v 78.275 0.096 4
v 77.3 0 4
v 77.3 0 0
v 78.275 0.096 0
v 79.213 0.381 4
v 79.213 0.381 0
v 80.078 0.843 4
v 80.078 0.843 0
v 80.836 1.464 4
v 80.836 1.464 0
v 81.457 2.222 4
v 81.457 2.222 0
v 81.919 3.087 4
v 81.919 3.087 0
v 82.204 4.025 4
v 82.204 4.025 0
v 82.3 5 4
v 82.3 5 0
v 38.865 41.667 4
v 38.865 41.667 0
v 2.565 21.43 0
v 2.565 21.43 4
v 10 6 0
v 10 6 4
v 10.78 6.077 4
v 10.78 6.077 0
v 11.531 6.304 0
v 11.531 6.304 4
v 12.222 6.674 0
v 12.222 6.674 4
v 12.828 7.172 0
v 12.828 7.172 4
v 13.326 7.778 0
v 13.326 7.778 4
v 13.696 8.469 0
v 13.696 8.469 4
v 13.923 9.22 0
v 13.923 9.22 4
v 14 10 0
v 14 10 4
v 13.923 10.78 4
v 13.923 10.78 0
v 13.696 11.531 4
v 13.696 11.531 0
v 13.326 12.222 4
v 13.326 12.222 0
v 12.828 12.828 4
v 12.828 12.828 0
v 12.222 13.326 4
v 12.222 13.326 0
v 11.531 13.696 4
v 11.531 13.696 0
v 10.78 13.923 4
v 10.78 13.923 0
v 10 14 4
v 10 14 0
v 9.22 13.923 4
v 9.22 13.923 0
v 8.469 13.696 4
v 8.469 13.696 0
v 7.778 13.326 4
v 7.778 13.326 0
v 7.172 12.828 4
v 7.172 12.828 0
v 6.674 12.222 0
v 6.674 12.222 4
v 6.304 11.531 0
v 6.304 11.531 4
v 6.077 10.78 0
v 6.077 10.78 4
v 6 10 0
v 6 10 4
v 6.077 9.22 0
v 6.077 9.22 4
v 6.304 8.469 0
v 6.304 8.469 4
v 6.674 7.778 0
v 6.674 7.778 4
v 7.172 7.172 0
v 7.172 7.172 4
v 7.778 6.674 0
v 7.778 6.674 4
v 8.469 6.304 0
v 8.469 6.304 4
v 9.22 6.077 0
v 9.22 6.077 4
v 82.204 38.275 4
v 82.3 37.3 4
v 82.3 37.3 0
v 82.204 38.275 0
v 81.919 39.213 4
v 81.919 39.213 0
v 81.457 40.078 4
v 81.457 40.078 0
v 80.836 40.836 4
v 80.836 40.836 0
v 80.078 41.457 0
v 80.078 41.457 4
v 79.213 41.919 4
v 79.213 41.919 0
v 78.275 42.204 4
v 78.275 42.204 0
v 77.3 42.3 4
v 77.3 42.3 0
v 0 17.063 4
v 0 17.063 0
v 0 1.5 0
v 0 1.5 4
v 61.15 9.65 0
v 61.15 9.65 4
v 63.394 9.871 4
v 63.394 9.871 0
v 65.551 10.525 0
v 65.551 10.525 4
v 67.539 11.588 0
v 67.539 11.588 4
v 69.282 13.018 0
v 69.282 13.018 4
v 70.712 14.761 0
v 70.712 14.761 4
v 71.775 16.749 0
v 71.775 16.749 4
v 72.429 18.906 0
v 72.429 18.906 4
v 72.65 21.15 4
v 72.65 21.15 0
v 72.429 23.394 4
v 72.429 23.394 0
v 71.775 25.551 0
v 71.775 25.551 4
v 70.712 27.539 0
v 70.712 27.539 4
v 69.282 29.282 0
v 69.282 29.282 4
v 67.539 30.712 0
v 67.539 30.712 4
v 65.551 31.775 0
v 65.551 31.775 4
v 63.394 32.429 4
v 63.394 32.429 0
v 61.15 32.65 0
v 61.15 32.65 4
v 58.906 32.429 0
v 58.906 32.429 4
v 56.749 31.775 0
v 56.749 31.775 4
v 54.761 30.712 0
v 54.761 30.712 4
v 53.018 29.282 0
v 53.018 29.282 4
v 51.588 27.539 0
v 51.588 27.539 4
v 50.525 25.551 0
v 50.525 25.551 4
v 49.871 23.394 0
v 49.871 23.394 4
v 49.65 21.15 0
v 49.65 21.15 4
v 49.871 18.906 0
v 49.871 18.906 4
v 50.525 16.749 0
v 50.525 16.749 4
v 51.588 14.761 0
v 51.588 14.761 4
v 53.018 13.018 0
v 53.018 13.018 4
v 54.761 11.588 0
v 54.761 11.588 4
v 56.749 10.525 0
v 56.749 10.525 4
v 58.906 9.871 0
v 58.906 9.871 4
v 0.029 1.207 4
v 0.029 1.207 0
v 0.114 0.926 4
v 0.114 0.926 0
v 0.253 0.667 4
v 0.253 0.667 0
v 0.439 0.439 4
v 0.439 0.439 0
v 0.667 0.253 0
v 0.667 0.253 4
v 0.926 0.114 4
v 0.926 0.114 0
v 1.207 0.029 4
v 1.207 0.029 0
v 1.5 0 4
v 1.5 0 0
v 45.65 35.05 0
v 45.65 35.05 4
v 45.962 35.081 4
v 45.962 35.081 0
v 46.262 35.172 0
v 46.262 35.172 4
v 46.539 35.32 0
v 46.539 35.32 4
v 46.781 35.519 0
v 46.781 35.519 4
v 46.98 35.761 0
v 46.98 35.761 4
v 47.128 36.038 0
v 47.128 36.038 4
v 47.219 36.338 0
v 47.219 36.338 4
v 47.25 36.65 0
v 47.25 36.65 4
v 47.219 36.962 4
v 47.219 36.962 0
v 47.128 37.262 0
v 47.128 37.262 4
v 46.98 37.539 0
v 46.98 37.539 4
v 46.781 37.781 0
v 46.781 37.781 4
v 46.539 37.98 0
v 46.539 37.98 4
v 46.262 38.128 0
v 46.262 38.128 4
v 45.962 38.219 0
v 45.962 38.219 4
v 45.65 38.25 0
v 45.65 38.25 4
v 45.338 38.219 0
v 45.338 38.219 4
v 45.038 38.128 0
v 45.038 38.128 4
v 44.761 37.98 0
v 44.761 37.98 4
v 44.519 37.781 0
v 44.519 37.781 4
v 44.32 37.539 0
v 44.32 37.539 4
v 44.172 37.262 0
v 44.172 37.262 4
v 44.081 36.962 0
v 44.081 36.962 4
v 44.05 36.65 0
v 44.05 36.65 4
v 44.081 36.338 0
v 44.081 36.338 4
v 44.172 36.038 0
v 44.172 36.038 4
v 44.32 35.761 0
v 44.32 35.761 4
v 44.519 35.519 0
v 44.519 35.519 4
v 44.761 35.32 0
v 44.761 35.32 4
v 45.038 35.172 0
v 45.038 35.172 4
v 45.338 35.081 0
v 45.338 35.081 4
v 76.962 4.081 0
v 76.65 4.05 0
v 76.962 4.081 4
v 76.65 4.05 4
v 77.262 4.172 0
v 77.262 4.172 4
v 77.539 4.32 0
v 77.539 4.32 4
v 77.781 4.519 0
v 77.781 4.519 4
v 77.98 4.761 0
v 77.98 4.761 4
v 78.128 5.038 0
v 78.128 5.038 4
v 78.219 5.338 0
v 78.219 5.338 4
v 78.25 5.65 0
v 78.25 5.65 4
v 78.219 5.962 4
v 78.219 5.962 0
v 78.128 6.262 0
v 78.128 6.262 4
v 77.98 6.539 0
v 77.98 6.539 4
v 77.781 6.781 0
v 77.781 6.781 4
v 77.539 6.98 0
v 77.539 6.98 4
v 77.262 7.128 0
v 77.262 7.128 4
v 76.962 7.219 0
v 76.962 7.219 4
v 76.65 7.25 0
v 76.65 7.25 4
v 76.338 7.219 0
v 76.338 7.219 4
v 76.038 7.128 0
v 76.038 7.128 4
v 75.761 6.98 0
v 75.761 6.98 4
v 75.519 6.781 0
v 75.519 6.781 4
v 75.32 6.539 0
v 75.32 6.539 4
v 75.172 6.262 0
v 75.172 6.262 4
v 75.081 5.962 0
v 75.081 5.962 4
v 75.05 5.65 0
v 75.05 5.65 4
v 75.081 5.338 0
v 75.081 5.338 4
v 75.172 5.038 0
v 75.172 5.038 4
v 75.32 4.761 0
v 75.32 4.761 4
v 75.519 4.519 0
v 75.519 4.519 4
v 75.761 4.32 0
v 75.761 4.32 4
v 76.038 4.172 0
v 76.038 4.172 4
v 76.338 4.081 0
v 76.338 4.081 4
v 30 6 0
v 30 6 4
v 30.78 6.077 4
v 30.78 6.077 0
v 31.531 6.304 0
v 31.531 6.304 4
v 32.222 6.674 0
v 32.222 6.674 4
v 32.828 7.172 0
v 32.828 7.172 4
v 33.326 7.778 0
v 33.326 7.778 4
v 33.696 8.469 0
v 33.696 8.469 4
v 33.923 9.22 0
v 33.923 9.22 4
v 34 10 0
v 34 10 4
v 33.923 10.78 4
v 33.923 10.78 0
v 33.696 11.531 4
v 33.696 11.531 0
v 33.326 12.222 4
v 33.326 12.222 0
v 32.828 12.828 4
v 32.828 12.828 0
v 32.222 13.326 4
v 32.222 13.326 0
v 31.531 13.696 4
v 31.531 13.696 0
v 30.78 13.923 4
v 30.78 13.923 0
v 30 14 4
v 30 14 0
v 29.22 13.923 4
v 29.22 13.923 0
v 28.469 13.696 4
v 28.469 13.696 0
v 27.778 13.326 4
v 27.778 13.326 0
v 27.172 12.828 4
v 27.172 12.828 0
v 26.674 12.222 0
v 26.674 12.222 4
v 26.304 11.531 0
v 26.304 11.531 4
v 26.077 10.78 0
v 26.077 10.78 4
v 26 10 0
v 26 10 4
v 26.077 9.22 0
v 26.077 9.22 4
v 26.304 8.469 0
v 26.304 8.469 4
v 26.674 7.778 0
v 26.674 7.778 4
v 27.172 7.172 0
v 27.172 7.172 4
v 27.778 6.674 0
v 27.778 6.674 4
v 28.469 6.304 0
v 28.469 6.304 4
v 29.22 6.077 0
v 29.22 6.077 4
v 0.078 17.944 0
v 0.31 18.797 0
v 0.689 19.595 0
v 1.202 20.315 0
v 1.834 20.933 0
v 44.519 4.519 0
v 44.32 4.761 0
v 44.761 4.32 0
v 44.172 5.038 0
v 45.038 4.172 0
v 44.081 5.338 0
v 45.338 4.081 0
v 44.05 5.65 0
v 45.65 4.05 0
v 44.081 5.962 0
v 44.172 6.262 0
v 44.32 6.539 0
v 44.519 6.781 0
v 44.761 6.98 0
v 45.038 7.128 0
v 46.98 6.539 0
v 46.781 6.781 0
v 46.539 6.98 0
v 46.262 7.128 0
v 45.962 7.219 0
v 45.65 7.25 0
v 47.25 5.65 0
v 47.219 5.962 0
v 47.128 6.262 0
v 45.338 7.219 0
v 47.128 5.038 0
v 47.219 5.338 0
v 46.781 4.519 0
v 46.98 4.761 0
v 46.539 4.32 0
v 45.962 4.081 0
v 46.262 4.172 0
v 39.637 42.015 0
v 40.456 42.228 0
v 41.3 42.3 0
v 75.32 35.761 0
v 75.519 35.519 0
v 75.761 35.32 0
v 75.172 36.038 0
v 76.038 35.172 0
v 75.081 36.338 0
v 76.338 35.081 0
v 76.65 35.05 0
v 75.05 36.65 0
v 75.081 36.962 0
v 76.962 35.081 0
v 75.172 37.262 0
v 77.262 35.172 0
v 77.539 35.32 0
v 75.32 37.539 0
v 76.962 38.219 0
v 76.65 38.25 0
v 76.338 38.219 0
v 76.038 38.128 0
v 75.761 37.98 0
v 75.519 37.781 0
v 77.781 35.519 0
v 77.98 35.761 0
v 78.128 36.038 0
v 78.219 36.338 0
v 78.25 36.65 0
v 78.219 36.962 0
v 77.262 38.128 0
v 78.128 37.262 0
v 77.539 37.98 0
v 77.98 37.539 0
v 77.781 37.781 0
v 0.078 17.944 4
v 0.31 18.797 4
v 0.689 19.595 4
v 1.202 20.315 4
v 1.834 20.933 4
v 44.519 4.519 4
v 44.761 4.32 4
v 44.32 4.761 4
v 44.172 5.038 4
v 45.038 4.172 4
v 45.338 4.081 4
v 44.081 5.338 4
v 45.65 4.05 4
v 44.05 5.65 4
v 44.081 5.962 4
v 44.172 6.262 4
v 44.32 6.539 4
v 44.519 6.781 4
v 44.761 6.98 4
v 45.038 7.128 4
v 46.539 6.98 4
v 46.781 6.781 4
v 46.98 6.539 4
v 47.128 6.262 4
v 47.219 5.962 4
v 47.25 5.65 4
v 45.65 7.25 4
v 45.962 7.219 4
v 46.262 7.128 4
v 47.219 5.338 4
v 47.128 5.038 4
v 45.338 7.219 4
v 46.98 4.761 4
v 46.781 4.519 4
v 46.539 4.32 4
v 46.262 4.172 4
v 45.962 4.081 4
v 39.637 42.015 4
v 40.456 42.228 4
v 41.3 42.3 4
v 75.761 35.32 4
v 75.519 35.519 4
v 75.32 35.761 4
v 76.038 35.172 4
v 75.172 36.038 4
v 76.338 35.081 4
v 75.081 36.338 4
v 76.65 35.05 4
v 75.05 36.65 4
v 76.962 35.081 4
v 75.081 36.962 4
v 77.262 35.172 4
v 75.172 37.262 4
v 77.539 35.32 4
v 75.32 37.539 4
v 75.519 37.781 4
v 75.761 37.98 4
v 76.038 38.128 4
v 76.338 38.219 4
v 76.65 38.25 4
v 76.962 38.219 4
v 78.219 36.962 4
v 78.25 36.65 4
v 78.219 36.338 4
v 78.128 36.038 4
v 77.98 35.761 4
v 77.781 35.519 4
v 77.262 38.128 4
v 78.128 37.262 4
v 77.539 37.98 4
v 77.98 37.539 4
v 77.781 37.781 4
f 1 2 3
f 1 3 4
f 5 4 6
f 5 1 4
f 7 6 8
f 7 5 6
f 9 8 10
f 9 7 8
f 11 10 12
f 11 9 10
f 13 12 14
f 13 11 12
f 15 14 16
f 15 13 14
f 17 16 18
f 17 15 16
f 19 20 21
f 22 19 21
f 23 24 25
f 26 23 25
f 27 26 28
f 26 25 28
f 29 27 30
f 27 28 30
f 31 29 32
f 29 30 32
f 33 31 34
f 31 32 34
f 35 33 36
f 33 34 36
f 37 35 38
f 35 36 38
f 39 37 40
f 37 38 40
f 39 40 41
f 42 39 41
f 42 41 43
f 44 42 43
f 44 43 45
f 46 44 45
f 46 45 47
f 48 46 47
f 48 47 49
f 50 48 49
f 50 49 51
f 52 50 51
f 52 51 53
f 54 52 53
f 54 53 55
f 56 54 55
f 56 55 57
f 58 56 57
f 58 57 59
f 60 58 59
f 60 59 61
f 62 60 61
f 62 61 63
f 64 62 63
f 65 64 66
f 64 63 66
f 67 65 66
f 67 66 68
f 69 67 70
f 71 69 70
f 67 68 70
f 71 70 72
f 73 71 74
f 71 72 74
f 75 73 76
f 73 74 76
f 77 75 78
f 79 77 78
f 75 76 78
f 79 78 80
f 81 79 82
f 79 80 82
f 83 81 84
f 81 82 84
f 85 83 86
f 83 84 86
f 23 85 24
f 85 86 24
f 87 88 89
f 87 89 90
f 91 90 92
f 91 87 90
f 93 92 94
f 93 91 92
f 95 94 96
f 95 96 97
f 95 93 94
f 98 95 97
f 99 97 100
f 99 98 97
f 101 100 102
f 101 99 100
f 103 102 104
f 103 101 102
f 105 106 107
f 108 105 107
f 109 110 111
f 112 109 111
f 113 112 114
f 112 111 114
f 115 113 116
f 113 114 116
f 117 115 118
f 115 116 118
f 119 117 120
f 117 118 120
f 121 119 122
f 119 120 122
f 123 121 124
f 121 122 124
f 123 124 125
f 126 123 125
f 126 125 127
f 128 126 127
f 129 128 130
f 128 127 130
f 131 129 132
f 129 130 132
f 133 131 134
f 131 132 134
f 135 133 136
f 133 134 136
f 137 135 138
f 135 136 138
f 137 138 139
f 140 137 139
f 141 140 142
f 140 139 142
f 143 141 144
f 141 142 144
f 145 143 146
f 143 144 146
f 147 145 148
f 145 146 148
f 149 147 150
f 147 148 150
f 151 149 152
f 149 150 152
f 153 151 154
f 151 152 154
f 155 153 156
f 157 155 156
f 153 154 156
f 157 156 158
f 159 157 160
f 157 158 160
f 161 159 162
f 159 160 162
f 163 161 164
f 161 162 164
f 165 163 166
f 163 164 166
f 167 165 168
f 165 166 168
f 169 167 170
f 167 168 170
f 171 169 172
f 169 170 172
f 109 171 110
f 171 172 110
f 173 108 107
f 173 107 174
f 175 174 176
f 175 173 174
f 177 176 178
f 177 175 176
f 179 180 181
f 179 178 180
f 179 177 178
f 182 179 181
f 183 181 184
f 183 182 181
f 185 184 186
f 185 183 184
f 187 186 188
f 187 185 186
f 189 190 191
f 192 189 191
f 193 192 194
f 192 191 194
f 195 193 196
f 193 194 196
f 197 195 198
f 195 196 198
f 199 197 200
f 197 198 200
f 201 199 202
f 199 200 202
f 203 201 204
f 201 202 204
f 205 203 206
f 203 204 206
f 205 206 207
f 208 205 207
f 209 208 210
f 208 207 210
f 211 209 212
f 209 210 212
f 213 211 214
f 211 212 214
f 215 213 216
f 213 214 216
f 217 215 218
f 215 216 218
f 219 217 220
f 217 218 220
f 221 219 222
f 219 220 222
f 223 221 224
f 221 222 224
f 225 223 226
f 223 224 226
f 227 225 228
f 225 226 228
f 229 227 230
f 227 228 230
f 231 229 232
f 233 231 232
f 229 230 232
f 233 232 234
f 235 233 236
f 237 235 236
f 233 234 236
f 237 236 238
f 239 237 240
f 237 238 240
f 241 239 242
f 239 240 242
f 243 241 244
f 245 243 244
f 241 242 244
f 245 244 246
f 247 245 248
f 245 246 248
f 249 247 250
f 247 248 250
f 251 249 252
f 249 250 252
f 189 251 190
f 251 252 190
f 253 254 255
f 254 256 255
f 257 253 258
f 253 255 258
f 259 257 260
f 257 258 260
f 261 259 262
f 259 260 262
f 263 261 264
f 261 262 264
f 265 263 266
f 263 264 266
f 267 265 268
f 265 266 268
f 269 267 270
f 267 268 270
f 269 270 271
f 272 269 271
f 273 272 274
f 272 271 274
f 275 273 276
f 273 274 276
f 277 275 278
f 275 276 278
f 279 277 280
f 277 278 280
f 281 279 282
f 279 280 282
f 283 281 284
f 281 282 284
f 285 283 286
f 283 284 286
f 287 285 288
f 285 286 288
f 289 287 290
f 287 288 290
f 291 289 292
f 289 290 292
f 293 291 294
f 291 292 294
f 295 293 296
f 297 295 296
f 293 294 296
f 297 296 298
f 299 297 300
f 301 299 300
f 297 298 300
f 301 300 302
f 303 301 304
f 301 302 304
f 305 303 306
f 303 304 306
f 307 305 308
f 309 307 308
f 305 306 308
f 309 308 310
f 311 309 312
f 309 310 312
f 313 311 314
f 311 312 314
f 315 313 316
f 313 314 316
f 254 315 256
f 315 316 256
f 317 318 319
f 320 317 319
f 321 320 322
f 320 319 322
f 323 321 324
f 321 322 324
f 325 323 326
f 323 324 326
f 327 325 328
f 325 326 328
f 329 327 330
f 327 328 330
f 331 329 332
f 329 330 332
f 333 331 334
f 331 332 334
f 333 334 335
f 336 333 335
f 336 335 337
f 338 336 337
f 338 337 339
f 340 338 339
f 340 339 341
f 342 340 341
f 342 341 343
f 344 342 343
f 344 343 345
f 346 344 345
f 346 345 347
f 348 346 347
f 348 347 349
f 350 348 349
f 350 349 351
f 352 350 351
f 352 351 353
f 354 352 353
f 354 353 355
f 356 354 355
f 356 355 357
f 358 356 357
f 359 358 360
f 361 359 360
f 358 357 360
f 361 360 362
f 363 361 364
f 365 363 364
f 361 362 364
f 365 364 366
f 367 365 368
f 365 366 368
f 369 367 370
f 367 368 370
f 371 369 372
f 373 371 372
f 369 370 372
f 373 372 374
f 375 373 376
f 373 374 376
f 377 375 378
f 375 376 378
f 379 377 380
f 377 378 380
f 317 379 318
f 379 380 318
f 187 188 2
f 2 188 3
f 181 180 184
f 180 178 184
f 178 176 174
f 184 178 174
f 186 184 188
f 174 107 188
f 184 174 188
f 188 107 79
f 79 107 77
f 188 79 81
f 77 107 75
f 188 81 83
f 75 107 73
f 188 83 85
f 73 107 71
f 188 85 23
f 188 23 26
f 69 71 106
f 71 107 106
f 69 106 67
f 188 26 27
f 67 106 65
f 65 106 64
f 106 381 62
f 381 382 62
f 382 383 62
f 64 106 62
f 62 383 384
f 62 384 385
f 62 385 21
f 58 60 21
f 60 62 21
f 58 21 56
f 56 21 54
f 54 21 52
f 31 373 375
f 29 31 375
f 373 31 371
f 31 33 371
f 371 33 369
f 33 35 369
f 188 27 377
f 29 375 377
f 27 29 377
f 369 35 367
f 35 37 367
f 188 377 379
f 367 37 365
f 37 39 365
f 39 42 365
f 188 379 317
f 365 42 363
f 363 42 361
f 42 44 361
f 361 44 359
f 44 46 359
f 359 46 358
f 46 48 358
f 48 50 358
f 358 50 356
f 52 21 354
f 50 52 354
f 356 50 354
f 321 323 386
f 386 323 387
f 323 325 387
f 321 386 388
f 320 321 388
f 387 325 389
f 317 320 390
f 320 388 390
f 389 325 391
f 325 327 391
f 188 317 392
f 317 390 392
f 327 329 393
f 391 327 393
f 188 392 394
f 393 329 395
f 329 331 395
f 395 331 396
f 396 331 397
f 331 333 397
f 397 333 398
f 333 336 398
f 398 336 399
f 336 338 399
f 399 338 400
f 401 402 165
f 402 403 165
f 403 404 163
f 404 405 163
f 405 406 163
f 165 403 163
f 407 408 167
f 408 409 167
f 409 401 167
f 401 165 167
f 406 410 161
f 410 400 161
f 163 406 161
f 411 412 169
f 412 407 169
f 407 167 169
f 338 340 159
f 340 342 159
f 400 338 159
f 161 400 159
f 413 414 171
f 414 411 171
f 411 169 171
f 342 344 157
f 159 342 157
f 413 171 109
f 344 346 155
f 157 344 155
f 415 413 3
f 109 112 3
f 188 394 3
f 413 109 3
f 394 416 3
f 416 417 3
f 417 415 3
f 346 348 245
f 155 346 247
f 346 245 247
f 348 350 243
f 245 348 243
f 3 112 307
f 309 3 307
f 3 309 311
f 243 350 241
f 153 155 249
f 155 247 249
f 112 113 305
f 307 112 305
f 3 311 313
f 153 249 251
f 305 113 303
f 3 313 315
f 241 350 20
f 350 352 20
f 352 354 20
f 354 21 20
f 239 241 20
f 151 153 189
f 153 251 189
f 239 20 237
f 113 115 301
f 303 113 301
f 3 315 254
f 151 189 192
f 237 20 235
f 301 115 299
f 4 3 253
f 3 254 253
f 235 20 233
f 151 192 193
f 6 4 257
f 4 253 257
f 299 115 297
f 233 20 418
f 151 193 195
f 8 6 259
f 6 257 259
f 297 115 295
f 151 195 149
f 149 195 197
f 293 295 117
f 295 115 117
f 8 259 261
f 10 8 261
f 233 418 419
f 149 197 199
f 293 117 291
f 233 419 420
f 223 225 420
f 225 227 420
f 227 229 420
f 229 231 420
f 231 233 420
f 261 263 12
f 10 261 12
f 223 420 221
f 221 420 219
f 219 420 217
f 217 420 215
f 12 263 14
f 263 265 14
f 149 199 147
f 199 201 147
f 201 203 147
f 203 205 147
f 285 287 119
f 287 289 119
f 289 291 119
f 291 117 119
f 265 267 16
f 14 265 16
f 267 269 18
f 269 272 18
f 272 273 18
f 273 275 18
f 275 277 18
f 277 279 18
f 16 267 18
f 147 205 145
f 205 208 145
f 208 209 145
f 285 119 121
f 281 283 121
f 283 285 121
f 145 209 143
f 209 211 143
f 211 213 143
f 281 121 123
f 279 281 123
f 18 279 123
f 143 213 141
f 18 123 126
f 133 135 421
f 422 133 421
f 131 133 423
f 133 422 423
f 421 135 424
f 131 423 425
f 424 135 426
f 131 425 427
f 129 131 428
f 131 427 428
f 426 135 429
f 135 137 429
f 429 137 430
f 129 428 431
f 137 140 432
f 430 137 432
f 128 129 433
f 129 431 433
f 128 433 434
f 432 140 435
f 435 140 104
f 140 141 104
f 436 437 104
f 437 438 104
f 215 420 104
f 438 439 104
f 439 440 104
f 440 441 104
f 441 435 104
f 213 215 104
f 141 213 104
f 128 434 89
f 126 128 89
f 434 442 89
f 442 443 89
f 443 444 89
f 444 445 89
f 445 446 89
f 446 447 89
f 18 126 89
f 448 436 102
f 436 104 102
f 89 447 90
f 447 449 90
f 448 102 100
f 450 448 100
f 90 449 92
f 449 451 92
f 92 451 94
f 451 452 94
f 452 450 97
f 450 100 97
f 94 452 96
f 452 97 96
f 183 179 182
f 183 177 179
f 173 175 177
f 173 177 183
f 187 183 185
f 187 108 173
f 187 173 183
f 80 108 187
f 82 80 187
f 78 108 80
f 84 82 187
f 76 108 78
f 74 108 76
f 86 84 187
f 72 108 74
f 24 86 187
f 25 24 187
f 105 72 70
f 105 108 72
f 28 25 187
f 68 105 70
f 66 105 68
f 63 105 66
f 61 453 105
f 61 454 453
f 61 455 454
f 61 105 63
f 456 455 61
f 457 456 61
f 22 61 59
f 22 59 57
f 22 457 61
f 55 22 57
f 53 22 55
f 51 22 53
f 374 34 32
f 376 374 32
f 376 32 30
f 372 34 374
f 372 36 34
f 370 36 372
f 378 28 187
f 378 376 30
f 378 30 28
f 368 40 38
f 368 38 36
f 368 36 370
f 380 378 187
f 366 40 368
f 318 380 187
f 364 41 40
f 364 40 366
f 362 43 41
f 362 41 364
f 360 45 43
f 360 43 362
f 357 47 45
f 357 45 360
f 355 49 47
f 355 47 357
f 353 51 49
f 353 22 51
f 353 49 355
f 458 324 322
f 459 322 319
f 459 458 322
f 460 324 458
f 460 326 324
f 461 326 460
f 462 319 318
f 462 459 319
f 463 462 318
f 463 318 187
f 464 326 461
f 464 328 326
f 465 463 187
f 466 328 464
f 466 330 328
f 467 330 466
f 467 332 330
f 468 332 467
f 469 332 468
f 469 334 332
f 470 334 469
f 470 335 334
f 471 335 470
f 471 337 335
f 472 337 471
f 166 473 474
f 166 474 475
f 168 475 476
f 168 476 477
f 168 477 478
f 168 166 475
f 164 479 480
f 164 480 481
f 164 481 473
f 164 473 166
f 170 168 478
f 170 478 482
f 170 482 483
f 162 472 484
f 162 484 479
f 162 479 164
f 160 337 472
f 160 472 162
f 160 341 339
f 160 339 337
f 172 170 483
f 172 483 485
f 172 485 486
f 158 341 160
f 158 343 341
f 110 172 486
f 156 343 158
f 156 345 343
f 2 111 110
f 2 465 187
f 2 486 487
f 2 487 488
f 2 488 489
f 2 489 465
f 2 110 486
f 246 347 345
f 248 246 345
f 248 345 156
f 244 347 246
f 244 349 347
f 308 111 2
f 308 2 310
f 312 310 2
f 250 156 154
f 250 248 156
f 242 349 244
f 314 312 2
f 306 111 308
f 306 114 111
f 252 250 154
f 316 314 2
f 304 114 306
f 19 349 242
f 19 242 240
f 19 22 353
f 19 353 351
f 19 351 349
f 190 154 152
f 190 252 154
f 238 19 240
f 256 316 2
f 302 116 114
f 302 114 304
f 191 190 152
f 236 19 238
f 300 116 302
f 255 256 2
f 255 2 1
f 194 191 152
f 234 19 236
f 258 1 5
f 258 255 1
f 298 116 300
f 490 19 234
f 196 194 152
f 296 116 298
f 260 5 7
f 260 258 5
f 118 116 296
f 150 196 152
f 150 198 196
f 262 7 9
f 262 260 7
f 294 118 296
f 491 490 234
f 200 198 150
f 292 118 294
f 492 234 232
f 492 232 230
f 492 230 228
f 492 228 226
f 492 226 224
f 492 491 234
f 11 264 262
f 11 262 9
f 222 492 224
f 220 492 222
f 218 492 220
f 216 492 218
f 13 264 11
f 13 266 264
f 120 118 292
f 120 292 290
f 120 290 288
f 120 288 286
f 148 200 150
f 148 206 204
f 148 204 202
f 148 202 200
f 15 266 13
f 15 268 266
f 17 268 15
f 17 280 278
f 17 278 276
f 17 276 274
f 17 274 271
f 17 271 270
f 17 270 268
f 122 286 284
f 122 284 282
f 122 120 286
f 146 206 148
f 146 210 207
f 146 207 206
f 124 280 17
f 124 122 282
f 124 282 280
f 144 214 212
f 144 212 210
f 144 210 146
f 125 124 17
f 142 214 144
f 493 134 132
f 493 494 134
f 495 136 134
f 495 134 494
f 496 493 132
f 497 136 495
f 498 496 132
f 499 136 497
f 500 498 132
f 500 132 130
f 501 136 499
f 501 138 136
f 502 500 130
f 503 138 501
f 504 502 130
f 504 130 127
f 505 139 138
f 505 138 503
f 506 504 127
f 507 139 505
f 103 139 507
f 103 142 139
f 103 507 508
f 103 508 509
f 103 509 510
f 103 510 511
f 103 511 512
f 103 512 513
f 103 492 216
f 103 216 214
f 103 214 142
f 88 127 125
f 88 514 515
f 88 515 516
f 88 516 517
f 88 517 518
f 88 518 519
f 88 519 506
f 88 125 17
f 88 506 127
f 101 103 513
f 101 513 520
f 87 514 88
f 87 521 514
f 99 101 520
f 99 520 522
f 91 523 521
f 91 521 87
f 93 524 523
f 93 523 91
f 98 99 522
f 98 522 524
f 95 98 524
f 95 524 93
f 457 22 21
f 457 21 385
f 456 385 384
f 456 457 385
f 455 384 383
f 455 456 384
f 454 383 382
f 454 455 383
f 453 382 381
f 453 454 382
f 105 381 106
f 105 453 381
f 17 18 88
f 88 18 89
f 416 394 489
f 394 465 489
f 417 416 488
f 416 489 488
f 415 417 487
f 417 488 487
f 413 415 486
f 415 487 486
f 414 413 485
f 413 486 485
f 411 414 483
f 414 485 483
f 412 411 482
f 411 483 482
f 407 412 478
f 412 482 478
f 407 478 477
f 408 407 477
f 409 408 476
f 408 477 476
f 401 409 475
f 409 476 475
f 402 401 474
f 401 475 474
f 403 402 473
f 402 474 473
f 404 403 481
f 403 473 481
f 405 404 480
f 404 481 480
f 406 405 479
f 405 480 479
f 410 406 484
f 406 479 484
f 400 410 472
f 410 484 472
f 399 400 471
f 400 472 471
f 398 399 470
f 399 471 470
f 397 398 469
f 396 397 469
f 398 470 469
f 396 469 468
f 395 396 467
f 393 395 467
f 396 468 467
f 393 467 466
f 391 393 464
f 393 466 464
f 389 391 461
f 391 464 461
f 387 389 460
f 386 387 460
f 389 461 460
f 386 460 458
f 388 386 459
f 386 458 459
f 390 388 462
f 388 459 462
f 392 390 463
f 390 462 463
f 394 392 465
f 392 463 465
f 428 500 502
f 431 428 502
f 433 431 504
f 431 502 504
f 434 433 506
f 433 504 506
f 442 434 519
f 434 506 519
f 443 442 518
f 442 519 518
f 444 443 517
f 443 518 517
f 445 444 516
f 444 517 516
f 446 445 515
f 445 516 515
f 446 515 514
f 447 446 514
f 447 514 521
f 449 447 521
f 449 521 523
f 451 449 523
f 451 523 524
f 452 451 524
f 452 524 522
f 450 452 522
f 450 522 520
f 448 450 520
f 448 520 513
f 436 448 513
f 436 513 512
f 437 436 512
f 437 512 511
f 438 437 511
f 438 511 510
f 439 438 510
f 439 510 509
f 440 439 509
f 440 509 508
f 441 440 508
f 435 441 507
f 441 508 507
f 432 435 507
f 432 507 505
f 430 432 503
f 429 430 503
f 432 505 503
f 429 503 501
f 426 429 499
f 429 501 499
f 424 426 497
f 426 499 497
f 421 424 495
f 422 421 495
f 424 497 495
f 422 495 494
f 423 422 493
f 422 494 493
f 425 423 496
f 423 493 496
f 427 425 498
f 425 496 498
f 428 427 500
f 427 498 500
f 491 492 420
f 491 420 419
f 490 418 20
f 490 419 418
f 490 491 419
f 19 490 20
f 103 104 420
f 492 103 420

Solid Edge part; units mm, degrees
sketch "Sketch1" plane through (0, 0, 0) normal (0, 0, 1) x (1, 0, 0)
  line L0 (0, 0) -> (82.3, 0)
  line L1 (82.3, 0) -> (82.3, 42.3)
  line L2 (82.3, 42.3) -> (40, 42.3)
  line L3 (40, 42.3) -> (0, 20)
  line L4 (0, 20) -> (0, 0)
extrude "Protrusion1" add sketch "Sketch1" along normal blind 4
hole "Hole_1" at (10, 10, 4) direction (0, 0, -1) diameter 8 end up to next
hole "Hole1" at (30, 10, 4) direction (0, 0, -1) diameter 8 end up to next
hole "Hole_3" at (61.15, 21.15, 4) direction (0, 0, -1) diameter 23 end up to next
hole "Hole_4" at (45.65, 36.65, 4) direction (0, 0, -1) diameter 3.2 end up to next
pattern_linear "Pattern2" count 2 spacing 31 along (1, 0, 0) count 2 spacing 31 along (0, -1, 0) of "Hole_4"
fillet "Round_1" radius 5 4 edges at (0, 20, 2) (82.3, 42.3, 2) (82.3, 0, 2) (40, 42.3, 2)
fillet "Round_2" radius 1.5 1 edges at (0, 0, 2)
properties material "Aluminum, 6061-T6"
